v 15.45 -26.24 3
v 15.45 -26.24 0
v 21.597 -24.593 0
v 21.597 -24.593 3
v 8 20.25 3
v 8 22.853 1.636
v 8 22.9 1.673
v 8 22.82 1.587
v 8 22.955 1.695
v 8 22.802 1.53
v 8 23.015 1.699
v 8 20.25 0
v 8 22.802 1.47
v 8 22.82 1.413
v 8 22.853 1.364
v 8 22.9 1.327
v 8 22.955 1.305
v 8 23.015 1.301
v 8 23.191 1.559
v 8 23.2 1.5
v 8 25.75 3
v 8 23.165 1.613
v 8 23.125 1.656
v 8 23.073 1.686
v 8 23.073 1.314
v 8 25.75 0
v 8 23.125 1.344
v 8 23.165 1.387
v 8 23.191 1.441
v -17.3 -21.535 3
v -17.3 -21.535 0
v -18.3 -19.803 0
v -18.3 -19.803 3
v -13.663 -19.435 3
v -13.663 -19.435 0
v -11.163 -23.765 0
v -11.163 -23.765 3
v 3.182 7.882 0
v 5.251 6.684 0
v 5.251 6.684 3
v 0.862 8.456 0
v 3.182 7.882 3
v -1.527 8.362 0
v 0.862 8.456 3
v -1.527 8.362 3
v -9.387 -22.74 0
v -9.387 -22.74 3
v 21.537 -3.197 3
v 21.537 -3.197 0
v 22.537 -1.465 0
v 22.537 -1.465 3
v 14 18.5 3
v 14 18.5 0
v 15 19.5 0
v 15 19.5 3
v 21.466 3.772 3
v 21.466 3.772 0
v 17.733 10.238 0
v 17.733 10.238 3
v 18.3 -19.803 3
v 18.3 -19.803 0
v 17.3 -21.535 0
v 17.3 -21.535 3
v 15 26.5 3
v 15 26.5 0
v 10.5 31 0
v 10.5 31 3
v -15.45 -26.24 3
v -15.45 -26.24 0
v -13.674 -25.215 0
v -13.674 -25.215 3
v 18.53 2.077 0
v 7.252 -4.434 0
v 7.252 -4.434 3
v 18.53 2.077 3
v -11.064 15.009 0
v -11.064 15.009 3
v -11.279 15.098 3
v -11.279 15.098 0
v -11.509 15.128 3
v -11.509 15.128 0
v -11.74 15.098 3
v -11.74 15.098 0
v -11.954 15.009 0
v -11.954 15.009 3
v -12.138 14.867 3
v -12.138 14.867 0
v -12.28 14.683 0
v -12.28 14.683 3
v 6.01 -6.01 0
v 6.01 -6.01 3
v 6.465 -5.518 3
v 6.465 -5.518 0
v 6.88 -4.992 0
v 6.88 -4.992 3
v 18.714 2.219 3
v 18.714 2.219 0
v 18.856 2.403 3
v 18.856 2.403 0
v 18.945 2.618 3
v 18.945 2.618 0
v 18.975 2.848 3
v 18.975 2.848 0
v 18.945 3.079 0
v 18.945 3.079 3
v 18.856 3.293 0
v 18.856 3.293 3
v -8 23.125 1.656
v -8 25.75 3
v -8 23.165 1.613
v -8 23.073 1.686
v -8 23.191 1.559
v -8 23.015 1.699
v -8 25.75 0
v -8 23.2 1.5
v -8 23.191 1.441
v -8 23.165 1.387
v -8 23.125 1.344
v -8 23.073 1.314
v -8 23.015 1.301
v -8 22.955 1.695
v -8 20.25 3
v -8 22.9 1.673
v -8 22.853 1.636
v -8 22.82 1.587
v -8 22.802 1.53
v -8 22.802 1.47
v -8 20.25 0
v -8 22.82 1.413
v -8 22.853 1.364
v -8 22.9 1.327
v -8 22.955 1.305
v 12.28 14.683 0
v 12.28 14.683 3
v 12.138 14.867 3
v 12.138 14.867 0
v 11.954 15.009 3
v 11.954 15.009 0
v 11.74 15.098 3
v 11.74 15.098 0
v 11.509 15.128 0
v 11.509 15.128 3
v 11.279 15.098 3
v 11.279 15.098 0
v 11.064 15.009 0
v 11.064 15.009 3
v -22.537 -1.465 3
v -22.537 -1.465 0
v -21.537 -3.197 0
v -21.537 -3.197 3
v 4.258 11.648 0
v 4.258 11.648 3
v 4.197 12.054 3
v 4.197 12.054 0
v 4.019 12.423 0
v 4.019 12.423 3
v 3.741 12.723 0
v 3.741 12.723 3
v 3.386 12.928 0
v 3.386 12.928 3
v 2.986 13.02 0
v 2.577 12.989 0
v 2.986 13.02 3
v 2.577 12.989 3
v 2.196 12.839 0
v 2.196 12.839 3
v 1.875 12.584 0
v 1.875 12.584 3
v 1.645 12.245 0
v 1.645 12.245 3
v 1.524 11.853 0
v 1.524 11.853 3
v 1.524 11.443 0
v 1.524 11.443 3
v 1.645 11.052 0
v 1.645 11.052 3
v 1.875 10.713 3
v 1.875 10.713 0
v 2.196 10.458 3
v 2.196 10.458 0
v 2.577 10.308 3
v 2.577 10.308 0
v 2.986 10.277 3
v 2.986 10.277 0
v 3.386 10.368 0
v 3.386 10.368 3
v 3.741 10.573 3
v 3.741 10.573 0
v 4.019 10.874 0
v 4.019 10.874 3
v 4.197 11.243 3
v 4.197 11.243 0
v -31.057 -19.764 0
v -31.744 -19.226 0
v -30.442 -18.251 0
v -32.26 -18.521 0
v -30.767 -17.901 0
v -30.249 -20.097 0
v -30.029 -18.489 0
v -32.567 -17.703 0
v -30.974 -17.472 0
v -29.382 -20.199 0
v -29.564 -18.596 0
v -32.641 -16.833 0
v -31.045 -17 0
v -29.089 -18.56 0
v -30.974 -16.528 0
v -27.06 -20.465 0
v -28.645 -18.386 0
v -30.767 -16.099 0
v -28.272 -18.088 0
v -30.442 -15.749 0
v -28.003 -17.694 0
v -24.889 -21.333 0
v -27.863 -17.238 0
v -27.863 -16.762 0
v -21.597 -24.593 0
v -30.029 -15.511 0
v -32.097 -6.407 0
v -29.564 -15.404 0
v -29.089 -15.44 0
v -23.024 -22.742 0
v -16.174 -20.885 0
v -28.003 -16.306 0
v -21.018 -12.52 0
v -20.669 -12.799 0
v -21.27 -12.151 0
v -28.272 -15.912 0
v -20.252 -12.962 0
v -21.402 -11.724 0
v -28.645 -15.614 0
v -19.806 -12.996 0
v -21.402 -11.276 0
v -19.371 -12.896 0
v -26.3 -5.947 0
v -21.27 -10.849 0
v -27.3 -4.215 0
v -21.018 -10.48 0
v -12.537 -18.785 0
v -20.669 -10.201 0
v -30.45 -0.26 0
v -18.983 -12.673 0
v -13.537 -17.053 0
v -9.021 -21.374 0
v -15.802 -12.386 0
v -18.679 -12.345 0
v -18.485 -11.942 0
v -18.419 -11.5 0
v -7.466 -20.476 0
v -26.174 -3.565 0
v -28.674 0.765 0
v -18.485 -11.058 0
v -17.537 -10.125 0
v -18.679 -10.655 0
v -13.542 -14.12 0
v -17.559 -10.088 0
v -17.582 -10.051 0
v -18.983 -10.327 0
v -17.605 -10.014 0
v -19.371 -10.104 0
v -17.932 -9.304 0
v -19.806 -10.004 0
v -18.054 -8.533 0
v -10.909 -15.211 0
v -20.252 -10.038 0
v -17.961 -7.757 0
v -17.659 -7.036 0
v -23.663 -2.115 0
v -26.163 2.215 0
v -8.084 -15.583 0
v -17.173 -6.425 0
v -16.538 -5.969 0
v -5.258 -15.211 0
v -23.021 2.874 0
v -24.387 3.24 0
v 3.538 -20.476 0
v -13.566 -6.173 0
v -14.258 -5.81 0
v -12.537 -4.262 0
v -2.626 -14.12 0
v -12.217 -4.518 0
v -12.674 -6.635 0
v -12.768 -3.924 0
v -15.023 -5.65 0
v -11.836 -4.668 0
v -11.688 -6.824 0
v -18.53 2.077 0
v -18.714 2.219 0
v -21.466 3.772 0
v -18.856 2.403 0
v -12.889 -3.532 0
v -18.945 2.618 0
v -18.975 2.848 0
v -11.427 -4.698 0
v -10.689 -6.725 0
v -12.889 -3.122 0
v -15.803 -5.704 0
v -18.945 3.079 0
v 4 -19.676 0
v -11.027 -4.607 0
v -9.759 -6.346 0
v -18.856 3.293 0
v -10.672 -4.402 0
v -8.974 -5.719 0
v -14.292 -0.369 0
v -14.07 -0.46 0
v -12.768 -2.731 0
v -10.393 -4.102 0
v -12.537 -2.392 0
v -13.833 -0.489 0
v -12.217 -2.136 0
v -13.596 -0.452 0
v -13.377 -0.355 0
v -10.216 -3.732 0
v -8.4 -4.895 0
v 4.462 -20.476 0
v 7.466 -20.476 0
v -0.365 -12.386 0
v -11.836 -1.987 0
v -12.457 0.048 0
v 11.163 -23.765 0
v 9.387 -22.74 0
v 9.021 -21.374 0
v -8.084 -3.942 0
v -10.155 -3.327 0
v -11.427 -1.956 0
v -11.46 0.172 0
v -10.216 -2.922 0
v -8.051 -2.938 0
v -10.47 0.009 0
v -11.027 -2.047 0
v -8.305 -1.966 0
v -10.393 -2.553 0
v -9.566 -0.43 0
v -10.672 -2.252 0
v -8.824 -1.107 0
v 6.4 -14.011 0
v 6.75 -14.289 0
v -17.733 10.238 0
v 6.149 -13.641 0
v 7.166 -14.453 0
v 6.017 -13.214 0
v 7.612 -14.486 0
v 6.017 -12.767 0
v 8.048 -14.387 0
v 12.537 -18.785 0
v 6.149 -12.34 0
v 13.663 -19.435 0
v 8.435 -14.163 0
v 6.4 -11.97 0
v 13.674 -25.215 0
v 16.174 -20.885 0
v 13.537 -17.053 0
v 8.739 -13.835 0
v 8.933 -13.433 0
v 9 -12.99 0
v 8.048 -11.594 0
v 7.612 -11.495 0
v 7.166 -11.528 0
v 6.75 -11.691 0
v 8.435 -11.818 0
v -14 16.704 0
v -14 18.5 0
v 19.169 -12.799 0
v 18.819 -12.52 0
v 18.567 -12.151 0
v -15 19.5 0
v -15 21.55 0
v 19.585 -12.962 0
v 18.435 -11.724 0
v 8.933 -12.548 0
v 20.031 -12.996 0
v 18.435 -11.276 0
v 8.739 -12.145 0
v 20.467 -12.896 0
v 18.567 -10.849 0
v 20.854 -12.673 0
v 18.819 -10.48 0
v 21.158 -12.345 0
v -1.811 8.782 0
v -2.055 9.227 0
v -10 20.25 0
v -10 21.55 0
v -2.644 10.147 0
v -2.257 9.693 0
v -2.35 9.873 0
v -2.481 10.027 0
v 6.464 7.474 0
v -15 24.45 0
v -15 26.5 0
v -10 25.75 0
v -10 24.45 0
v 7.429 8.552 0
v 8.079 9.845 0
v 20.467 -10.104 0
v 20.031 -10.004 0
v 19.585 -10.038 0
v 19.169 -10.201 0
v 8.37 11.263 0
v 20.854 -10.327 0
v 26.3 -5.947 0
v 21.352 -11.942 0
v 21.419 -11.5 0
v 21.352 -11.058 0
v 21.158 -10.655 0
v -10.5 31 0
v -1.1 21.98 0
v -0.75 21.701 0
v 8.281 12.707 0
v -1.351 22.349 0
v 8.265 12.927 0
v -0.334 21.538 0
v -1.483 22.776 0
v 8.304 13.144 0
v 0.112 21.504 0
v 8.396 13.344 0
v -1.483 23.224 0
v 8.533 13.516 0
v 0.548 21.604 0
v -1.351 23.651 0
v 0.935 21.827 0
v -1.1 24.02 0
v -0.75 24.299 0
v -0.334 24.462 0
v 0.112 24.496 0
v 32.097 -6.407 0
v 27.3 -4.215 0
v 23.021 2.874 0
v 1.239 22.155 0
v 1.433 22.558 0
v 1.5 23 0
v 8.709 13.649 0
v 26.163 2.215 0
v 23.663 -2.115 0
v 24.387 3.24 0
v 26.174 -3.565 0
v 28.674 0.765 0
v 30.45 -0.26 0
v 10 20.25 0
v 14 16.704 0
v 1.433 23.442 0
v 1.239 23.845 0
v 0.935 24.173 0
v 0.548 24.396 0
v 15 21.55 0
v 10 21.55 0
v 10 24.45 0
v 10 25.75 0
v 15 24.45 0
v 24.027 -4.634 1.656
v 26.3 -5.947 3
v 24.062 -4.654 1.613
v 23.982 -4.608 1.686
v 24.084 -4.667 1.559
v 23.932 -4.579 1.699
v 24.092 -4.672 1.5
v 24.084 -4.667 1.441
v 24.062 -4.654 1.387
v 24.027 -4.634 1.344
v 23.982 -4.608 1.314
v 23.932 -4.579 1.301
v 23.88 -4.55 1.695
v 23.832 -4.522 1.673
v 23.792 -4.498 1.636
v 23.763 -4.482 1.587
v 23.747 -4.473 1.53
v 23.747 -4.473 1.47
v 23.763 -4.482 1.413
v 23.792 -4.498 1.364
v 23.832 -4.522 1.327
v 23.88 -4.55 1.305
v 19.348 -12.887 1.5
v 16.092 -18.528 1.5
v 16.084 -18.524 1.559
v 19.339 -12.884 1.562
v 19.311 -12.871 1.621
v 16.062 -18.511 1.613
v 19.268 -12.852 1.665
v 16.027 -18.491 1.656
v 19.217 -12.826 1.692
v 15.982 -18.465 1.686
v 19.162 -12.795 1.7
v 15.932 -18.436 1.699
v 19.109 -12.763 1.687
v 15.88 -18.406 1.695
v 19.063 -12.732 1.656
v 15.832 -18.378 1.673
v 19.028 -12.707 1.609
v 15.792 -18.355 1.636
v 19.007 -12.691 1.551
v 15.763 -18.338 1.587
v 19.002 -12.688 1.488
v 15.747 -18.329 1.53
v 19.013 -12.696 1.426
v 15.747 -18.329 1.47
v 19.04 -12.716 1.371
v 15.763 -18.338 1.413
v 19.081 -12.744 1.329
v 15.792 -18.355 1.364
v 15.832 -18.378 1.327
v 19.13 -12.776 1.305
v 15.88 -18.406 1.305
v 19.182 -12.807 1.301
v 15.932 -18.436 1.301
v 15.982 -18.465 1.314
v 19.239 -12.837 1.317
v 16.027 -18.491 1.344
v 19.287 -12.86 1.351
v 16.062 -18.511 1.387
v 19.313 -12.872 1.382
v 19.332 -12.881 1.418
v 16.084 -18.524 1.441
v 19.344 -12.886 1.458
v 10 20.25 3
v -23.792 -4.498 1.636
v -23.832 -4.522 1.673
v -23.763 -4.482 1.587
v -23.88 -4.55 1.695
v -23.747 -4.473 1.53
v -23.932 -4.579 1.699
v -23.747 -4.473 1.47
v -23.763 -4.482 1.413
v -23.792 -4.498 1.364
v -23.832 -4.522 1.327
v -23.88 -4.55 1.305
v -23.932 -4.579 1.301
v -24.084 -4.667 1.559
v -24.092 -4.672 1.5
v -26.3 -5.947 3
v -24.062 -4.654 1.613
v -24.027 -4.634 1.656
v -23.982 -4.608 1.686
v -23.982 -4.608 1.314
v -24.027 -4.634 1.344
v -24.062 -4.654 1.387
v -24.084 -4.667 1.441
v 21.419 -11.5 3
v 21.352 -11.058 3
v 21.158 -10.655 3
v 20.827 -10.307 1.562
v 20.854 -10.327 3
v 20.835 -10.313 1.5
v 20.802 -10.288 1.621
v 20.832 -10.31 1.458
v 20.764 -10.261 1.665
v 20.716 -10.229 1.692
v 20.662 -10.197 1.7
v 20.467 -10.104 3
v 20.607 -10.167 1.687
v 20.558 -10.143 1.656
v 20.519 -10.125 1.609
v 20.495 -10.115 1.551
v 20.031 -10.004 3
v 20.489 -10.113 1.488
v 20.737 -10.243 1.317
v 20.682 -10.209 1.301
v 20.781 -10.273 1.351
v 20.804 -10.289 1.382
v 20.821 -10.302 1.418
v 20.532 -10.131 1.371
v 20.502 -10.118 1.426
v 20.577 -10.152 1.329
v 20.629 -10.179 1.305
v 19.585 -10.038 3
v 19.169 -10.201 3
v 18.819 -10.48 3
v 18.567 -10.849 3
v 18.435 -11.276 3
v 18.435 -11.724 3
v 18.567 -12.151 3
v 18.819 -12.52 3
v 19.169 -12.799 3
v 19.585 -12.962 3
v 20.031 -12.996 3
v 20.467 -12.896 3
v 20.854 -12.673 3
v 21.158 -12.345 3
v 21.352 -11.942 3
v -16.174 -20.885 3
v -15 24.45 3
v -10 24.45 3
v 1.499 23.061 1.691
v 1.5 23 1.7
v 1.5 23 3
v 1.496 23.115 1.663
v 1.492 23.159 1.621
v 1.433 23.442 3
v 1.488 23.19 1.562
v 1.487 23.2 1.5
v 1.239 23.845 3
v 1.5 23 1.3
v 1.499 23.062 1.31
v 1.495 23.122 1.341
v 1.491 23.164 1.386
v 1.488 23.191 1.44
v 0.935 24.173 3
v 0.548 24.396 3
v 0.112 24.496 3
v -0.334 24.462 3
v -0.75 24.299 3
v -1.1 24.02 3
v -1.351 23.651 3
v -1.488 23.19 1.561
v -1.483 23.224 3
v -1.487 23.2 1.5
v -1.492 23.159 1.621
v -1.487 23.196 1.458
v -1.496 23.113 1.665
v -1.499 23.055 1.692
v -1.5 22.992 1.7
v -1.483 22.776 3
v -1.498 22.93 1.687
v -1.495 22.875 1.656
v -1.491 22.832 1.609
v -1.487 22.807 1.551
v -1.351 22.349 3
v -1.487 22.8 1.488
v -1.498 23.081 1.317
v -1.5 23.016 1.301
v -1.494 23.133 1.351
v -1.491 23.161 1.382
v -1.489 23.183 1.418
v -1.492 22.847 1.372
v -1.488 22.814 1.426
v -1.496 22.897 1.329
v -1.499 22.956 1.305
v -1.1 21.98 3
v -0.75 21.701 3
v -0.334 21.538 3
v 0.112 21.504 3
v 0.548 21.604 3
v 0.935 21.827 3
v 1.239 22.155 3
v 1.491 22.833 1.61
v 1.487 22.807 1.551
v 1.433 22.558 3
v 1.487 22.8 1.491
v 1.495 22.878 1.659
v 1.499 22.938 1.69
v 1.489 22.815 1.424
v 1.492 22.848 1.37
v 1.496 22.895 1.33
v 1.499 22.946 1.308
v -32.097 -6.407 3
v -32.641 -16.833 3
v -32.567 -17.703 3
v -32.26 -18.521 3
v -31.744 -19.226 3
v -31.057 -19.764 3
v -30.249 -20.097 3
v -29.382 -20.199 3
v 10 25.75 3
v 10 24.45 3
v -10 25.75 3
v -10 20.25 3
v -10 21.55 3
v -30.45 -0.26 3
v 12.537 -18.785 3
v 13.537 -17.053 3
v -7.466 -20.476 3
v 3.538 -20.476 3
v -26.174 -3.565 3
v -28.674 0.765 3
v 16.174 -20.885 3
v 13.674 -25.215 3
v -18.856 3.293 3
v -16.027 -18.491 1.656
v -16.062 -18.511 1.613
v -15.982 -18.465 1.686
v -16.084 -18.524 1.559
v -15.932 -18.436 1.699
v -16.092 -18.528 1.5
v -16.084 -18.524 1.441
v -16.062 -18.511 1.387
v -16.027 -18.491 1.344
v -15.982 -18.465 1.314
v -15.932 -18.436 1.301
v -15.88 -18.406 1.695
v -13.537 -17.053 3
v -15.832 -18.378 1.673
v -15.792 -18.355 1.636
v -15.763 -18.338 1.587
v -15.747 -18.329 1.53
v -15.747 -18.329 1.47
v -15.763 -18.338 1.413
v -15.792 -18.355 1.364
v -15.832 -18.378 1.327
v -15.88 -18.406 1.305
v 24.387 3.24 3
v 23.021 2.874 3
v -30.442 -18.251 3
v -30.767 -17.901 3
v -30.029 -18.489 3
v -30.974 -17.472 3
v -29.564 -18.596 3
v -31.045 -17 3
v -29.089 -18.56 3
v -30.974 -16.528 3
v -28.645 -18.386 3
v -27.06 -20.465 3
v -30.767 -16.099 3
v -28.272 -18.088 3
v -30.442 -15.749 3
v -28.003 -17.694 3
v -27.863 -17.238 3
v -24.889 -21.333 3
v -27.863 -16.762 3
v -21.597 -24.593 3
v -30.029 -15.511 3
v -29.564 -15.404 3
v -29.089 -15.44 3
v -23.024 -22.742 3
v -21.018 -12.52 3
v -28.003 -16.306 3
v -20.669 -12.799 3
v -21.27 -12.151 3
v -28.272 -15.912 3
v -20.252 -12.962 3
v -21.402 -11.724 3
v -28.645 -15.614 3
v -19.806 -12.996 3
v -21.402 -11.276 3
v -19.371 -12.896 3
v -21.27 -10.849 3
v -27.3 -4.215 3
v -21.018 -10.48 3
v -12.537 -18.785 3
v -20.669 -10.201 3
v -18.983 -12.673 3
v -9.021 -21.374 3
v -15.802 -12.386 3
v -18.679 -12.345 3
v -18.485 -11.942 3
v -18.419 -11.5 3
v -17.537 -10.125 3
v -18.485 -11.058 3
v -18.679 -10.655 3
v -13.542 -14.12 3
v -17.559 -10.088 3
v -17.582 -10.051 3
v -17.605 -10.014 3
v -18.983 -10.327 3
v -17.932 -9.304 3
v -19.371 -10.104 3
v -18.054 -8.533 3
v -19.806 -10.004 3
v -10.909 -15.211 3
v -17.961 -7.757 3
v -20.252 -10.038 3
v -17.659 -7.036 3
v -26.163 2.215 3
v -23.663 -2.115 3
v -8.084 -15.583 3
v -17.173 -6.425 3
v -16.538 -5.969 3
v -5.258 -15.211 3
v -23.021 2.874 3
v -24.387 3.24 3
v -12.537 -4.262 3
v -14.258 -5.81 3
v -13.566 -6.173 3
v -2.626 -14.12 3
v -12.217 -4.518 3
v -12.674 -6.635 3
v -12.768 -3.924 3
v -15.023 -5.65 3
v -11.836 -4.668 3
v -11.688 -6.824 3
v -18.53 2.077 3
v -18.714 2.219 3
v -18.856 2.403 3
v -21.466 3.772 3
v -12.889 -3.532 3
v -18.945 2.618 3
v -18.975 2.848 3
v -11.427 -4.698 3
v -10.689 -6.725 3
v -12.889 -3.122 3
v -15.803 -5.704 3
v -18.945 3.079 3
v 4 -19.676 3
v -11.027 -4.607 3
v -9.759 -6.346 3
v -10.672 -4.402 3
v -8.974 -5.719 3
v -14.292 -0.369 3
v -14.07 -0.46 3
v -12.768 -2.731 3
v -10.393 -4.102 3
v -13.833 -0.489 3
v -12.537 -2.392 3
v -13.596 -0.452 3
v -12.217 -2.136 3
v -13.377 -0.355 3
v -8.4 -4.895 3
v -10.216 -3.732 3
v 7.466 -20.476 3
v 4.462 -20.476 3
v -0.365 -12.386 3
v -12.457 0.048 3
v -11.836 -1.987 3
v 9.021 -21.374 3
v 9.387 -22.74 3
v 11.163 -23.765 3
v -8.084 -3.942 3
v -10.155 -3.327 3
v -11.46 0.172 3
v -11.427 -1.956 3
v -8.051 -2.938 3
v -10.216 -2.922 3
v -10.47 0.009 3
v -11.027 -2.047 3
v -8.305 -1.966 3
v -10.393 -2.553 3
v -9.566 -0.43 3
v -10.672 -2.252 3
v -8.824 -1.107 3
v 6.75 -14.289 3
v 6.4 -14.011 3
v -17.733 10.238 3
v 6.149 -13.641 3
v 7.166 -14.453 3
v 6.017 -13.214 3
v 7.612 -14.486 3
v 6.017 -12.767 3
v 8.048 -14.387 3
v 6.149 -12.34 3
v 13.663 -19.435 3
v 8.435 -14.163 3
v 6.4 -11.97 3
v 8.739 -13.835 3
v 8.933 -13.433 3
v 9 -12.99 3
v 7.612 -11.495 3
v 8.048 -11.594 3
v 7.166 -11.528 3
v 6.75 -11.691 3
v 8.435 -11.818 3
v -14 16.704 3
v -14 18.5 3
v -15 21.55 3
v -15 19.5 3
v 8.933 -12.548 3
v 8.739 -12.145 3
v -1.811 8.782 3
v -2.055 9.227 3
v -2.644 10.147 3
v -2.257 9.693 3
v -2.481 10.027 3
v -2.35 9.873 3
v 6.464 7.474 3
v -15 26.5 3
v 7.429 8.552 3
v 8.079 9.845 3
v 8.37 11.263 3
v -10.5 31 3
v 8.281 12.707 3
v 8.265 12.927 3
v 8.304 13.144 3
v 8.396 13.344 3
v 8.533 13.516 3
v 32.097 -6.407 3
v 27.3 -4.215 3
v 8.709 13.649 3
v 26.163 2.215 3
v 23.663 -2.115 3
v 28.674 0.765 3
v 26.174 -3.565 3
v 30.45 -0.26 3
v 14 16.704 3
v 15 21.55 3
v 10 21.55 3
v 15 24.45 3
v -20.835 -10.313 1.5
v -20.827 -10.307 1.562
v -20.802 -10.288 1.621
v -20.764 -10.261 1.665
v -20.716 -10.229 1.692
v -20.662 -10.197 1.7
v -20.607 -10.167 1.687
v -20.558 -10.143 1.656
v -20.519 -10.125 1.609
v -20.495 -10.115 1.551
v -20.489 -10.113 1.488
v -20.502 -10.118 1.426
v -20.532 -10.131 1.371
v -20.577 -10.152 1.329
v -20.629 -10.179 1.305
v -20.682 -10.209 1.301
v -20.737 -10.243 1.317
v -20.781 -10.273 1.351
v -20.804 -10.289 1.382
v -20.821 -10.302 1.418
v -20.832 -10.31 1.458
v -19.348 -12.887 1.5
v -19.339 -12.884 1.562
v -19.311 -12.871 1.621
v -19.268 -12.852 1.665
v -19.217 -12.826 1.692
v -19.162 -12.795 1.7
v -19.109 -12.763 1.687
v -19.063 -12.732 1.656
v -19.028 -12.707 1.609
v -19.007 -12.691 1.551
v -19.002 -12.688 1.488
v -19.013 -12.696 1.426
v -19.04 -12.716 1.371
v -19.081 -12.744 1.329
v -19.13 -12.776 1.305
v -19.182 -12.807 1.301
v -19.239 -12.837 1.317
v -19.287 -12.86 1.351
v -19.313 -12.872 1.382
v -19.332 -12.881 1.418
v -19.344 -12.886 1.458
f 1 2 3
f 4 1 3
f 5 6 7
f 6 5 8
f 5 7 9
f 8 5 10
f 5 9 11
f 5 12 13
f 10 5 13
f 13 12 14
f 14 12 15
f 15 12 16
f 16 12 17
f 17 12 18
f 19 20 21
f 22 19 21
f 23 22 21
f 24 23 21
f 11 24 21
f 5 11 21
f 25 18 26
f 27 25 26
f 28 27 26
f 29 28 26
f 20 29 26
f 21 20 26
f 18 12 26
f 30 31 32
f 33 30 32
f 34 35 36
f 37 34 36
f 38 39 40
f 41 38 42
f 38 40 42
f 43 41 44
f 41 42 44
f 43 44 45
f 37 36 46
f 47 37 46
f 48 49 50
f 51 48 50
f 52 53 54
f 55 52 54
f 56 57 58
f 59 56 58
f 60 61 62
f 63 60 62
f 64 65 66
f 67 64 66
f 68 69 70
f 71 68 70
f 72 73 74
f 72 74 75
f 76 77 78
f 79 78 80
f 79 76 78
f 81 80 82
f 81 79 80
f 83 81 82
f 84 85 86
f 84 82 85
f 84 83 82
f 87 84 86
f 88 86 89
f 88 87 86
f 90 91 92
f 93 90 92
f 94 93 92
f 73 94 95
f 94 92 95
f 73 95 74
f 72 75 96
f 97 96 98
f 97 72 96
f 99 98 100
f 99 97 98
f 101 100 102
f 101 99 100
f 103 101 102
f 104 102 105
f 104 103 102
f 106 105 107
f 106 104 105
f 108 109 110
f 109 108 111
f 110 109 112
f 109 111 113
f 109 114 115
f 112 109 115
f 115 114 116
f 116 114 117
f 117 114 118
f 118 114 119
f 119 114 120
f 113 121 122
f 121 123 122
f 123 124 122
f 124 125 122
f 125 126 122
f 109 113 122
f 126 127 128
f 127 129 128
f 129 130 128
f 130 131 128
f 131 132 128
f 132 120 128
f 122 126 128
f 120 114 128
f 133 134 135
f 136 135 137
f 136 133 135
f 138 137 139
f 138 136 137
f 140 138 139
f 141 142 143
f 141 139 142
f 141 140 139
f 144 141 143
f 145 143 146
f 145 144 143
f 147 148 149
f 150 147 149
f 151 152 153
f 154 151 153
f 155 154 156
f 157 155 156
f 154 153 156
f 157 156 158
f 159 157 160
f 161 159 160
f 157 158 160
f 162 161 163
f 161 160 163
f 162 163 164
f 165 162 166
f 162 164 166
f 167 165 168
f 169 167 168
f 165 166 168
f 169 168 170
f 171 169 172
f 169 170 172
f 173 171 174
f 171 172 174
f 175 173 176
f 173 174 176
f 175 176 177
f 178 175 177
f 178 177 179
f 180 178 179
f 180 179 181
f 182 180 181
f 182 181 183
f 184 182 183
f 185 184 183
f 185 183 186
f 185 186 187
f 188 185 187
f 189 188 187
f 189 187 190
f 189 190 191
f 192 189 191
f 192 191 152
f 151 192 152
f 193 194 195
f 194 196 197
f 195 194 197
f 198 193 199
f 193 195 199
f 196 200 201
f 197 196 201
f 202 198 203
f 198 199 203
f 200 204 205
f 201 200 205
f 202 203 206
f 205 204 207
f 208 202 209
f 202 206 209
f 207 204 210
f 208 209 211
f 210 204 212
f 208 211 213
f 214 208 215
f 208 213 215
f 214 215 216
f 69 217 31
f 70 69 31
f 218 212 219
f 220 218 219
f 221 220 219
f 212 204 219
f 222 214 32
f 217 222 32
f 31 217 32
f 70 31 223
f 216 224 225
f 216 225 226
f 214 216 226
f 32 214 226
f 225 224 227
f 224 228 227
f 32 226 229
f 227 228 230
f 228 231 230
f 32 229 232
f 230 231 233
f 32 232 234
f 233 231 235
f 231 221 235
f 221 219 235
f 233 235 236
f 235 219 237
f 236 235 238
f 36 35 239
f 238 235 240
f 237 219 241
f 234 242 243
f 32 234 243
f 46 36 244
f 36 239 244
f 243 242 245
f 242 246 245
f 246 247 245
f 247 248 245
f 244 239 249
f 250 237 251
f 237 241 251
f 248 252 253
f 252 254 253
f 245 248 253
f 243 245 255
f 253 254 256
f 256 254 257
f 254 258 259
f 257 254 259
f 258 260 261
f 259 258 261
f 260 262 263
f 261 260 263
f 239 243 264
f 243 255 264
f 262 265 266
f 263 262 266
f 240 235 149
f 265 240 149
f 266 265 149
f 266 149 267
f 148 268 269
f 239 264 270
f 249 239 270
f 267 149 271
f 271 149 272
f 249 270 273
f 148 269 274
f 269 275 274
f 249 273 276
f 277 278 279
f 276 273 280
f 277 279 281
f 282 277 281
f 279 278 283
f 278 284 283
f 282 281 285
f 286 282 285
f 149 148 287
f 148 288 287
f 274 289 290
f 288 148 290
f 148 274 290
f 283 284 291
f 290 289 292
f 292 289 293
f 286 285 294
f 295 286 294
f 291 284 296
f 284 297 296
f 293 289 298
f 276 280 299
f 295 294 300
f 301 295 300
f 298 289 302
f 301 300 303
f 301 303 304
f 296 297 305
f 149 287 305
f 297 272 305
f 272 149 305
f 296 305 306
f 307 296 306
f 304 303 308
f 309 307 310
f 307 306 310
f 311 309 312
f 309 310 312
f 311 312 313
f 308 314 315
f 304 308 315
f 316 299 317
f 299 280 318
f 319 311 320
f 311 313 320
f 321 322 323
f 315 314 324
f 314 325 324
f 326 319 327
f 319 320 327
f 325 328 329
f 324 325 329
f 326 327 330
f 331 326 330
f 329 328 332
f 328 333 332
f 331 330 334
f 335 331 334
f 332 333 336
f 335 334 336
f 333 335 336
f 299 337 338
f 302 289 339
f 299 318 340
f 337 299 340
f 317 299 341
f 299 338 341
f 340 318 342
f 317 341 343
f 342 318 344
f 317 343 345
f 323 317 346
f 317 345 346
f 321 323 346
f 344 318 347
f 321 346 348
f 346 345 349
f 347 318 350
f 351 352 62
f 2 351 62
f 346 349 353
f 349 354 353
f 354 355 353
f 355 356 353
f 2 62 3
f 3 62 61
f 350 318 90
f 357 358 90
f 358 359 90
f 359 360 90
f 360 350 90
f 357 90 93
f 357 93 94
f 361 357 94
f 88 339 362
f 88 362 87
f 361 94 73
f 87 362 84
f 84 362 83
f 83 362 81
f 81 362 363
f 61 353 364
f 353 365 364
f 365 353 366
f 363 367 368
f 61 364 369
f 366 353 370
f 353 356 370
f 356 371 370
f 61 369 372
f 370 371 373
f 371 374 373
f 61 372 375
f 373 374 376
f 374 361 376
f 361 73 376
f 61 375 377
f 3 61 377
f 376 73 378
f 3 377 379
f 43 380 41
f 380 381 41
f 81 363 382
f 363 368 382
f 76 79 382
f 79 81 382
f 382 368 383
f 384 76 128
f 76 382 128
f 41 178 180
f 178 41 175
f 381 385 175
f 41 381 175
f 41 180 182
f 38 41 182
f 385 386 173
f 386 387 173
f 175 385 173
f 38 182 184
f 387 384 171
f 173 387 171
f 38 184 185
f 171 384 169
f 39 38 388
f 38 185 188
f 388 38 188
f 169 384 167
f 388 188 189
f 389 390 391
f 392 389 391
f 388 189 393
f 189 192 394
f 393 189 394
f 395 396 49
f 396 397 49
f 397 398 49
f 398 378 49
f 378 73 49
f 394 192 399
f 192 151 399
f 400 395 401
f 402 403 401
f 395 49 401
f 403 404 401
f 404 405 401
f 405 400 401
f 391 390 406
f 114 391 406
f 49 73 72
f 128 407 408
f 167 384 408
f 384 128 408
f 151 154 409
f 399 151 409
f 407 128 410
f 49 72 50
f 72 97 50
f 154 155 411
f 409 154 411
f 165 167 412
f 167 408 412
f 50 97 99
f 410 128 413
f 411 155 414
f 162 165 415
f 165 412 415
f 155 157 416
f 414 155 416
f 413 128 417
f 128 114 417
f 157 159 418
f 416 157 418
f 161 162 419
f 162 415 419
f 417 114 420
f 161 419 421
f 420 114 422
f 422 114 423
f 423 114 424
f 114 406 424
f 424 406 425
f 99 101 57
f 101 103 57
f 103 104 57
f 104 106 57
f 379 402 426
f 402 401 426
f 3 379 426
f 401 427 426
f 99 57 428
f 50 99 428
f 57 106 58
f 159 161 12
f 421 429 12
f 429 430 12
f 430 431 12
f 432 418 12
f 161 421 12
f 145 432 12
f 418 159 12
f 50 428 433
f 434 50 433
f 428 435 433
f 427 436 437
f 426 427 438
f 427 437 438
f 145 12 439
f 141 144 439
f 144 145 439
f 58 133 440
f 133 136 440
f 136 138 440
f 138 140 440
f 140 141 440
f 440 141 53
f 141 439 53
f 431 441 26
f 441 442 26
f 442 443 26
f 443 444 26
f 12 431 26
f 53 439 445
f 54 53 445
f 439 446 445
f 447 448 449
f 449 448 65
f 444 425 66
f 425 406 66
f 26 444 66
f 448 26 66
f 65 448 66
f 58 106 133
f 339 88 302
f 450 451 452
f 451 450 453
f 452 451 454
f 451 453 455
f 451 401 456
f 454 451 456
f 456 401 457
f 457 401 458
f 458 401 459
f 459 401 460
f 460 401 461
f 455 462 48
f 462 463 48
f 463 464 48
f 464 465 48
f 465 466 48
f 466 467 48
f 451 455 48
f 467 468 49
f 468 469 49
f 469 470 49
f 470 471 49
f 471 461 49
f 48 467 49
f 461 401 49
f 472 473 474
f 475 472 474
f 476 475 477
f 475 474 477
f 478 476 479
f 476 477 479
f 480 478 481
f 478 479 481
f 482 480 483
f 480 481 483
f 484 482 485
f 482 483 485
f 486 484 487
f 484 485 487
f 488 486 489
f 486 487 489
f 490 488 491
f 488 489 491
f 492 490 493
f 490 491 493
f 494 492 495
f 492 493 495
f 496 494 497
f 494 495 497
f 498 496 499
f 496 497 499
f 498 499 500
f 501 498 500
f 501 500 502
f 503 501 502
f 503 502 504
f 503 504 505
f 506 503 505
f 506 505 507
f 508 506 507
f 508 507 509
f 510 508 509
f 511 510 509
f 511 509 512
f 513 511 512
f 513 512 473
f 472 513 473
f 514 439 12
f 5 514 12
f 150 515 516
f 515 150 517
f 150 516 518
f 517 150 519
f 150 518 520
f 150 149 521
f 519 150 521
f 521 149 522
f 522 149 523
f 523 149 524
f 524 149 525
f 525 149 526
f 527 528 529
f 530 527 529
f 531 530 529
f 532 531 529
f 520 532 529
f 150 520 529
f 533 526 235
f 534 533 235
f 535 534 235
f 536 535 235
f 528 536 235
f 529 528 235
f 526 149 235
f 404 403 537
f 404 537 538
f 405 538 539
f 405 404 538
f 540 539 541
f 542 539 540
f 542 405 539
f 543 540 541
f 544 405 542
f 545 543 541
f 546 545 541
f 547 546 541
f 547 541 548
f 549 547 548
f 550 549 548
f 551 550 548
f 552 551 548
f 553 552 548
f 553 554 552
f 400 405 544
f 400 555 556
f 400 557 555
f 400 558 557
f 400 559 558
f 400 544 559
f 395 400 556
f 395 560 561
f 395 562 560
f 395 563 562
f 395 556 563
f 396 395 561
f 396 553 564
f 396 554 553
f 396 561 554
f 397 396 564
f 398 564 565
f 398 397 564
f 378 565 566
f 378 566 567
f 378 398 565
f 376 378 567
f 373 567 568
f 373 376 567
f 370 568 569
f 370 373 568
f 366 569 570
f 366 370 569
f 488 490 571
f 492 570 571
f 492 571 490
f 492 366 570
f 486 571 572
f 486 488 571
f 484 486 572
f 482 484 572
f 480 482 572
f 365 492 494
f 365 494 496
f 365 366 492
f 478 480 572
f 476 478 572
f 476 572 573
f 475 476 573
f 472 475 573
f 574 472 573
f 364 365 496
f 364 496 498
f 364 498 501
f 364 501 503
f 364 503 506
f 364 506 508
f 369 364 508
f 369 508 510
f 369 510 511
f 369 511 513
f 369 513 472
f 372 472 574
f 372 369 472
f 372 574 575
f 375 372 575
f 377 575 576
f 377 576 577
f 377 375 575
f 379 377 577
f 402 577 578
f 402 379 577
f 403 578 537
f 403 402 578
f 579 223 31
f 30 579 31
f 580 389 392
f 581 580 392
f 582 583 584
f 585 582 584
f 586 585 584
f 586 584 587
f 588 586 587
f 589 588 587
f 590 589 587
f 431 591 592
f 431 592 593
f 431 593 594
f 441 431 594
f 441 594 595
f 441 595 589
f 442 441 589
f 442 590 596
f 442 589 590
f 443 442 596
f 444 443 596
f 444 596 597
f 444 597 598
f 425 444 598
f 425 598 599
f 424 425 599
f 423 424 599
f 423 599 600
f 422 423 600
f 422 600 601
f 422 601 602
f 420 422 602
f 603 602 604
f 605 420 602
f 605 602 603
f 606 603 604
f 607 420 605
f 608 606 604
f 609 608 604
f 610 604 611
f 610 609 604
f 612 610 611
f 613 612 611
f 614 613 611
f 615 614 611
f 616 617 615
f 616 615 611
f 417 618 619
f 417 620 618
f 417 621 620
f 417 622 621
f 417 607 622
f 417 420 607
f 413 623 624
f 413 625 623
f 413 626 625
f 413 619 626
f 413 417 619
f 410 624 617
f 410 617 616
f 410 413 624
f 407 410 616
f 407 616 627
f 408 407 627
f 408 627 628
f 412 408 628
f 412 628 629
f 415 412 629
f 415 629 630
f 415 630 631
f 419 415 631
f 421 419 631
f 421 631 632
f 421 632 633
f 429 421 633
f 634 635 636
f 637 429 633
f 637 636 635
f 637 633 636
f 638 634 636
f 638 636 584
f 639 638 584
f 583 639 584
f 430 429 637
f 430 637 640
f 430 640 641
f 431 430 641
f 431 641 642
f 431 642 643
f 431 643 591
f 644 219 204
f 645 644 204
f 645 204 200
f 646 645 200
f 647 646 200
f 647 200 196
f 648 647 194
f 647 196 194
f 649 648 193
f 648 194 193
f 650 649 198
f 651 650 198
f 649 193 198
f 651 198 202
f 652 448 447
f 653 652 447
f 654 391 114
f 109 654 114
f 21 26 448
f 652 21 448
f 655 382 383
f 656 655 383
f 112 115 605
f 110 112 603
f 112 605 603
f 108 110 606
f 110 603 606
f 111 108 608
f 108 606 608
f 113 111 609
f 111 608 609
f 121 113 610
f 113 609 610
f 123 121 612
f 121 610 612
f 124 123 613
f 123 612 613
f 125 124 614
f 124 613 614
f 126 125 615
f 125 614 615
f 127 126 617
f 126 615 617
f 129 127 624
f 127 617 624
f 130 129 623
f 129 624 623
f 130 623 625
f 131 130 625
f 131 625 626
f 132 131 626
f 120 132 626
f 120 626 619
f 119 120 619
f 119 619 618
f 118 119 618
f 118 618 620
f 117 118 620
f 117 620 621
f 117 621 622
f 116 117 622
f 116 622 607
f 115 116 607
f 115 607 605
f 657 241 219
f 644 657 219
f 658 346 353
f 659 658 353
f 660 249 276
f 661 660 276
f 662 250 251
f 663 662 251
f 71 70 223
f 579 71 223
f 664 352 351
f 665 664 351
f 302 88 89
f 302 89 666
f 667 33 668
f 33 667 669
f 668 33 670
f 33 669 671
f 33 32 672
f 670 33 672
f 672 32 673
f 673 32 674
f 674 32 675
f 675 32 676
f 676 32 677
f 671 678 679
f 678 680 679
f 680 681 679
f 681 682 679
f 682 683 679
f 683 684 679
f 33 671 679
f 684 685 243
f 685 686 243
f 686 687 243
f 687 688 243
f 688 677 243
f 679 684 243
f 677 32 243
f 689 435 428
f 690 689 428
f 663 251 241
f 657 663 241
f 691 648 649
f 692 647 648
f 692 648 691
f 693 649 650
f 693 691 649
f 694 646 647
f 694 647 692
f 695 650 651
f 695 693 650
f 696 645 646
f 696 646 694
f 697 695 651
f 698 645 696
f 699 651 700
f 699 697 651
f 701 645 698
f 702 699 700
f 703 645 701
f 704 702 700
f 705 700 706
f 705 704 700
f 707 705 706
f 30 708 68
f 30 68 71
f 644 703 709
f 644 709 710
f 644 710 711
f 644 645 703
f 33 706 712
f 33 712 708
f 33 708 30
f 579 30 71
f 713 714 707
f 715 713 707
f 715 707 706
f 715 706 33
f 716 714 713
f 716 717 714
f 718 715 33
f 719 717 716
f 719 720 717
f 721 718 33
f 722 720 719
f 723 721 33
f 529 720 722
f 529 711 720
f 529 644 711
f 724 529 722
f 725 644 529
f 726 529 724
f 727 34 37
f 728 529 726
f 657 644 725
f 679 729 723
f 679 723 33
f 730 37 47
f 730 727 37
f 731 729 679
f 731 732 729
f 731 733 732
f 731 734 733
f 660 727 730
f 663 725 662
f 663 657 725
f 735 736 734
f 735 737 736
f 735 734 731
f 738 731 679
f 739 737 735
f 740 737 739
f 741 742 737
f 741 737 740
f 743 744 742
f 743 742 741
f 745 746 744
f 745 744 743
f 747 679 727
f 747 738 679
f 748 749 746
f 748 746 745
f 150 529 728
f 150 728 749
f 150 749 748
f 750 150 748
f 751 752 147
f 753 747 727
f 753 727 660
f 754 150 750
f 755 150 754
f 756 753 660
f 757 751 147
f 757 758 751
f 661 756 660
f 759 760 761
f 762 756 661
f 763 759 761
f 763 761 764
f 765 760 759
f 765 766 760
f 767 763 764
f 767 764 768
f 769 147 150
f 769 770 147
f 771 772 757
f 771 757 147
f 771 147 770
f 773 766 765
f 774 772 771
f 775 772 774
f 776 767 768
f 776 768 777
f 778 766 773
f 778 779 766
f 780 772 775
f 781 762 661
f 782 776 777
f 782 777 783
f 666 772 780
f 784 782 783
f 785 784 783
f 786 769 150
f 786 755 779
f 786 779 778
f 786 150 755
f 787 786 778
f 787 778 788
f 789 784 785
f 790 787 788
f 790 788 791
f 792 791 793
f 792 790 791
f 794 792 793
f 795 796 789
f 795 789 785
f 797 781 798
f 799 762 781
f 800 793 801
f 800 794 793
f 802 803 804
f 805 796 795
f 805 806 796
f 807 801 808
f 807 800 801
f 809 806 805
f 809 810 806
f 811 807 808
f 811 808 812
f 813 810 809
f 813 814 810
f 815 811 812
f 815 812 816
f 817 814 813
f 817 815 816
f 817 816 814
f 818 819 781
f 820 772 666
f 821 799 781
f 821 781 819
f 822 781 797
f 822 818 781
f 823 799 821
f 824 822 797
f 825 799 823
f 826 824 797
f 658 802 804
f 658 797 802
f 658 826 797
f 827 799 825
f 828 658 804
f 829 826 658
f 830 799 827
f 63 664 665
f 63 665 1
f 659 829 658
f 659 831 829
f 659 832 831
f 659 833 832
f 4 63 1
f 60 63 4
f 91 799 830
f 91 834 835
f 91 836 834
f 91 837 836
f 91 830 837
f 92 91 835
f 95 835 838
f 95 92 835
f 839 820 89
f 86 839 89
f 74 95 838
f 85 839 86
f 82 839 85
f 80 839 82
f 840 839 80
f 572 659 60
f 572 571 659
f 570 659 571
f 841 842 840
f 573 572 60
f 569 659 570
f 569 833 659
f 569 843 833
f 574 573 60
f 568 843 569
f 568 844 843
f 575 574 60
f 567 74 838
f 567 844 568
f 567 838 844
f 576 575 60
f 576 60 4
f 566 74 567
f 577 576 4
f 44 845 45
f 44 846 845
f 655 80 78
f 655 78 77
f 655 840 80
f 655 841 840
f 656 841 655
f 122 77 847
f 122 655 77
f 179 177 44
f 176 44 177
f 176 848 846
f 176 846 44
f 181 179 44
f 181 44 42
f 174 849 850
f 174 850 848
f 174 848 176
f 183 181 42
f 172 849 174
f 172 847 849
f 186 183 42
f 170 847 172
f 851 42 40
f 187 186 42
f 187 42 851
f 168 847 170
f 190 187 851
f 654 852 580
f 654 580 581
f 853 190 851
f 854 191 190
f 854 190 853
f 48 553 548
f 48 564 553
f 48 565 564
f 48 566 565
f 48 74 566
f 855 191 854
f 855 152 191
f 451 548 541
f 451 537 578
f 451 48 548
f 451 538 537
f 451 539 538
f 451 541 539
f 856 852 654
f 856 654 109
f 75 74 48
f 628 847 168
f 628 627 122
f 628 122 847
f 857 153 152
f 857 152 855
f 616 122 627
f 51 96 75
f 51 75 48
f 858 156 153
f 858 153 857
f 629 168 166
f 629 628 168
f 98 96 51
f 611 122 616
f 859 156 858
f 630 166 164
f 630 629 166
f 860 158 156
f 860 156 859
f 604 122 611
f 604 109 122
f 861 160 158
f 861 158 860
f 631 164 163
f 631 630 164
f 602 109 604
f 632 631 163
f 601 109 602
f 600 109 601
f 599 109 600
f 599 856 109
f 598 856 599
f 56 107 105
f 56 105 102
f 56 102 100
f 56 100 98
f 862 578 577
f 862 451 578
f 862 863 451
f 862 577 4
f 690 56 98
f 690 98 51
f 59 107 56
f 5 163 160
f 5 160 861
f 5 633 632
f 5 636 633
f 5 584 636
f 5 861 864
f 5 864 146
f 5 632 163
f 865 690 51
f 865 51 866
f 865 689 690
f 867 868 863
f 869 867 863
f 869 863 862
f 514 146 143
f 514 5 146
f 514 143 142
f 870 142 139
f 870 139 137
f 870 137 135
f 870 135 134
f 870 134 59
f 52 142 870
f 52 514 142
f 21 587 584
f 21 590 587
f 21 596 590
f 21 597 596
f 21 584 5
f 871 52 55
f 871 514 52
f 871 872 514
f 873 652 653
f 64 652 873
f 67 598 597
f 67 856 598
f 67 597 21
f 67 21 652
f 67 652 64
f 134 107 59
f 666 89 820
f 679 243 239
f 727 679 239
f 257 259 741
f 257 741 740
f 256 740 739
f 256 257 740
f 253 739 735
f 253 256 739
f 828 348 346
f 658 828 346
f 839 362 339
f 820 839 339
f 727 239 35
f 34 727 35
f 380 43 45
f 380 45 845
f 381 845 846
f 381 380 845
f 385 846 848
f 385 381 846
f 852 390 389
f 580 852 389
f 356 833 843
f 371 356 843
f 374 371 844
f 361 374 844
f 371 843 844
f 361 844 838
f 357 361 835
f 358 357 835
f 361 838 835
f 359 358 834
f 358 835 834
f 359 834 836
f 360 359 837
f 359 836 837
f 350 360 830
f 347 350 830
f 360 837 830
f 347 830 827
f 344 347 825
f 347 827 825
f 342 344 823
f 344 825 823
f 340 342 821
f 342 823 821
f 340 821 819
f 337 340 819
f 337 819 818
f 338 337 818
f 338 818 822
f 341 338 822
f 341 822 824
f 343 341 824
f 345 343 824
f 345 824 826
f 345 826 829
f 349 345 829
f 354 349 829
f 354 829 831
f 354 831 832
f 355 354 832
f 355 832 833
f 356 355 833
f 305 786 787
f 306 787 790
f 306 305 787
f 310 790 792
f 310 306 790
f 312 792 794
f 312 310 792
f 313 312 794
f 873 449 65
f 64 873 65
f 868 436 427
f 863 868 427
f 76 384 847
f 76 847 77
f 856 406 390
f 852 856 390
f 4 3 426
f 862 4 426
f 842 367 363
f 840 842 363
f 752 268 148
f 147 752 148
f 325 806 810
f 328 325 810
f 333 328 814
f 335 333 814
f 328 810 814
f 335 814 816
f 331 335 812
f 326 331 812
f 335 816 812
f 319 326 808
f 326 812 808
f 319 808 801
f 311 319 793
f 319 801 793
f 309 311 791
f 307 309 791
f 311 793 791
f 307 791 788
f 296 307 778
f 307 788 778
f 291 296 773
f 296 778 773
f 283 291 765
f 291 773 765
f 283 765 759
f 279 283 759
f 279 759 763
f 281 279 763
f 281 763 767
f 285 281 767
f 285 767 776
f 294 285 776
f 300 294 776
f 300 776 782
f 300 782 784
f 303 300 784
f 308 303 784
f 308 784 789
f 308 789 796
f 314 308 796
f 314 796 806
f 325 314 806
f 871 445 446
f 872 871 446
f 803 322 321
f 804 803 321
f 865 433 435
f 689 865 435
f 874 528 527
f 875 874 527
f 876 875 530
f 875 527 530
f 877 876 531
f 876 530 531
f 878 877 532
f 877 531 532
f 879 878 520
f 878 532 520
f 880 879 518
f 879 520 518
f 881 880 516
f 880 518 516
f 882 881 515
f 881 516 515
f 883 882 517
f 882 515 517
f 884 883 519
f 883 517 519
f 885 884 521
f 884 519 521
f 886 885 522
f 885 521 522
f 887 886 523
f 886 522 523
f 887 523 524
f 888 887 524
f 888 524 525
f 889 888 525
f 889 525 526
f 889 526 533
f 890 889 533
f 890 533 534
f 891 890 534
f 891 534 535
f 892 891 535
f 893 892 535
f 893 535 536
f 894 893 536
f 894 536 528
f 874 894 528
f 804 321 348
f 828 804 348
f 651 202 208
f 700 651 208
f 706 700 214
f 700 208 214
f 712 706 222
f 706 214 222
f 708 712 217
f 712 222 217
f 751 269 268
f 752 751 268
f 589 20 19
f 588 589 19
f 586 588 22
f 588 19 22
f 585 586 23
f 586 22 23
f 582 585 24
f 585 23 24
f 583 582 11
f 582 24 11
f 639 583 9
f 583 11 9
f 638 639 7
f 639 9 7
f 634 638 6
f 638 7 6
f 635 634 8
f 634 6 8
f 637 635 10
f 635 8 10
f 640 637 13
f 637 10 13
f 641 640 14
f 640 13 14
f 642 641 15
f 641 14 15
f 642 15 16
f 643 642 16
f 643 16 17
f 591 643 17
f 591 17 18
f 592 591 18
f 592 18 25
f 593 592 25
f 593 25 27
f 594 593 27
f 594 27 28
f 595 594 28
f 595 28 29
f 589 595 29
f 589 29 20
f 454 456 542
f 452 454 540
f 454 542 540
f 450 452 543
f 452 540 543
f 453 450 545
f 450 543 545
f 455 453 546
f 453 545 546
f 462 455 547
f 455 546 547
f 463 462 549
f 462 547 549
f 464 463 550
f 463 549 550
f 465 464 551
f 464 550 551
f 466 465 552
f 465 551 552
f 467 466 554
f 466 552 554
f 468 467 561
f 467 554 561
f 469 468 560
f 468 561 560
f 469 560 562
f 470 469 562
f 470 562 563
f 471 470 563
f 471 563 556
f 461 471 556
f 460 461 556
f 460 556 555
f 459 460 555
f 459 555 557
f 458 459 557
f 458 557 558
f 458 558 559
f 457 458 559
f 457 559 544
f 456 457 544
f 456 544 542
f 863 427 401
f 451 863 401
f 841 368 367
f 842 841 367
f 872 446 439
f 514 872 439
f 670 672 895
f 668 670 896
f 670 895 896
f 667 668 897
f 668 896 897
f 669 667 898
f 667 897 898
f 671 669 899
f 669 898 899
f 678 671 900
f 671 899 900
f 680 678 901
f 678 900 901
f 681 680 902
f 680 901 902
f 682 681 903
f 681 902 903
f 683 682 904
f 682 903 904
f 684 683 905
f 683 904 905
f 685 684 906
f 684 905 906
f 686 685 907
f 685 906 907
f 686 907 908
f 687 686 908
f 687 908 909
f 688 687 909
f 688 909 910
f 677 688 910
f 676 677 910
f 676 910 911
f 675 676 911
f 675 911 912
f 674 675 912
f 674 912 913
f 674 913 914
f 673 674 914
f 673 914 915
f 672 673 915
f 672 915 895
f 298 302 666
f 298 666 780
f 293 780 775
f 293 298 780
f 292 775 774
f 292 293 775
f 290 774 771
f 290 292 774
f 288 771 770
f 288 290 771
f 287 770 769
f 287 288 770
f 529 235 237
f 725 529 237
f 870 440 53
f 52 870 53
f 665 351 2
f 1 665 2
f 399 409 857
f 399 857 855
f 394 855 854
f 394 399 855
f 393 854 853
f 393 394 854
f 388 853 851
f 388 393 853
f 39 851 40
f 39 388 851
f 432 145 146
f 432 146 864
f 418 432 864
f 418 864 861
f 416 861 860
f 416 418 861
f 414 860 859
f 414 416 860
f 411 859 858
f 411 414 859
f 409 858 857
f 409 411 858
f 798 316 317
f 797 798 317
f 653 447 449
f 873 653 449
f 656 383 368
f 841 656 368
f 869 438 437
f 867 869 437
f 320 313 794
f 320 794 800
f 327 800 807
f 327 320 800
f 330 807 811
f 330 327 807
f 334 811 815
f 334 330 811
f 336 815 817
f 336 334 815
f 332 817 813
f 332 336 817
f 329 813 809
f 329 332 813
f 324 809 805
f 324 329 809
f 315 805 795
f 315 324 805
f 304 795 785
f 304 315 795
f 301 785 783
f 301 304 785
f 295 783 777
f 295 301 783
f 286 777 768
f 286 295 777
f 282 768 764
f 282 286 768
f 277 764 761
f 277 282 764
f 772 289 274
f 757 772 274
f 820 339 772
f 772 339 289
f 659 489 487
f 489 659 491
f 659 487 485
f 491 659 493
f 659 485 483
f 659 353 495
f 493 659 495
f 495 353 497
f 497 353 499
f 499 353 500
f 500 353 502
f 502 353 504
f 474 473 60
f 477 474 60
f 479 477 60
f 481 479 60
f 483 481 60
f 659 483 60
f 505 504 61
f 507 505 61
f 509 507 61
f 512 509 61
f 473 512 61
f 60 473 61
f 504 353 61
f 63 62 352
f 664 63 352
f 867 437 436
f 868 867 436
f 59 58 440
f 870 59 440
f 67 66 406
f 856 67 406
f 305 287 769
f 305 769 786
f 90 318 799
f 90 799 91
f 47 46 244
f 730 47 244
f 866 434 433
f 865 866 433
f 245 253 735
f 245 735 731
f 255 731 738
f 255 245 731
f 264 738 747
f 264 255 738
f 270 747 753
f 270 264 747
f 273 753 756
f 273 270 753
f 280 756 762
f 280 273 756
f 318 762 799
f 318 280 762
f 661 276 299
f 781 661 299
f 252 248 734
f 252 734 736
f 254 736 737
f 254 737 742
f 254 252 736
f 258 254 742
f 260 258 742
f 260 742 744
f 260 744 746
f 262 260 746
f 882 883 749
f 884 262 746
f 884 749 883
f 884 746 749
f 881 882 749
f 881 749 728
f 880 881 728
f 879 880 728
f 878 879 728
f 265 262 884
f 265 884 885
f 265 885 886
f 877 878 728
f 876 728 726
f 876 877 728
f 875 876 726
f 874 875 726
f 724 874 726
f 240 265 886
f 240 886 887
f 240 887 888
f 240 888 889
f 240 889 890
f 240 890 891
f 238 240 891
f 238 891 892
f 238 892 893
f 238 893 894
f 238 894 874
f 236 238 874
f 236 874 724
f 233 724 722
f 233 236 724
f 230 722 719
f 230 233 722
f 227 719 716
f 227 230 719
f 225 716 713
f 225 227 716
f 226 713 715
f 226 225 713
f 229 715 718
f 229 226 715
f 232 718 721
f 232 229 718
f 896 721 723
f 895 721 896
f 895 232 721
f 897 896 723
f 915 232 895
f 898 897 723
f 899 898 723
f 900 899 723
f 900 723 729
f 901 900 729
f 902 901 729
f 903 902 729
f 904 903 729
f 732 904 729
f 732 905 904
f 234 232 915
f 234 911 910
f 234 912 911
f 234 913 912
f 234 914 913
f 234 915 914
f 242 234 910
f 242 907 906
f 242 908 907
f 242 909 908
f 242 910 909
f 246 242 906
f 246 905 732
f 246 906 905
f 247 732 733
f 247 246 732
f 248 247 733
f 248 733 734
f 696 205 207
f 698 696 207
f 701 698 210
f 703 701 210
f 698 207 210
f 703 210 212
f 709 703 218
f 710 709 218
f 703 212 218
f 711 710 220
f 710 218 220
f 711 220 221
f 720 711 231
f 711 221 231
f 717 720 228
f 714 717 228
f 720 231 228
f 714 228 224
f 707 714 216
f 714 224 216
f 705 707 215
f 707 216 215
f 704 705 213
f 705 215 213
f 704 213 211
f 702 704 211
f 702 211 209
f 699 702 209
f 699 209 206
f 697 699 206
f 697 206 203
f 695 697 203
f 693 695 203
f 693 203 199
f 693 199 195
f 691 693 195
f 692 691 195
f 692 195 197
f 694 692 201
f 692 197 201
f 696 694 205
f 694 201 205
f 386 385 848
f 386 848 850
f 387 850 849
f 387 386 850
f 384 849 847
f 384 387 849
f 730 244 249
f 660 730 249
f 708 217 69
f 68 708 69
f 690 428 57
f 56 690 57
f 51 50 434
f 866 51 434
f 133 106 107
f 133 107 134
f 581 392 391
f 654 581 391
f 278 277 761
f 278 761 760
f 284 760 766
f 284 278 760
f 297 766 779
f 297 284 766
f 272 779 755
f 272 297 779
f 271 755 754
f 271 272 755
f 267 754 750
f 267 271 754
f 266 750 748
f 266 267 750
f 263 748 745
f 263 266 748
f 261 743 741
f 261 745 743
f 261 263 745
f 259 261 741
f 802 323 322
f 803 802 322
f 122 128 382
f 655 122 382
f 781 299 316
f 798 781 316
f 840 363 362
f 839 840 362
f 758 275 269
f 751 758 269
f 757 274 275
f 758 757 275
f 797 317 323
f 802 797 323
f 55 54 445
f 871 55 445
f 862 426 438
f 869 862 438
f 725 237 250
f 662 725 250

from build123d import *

# Parameters (mm, degrees)
SKETCH1_R           = 1.5
BOSS_EXTRUDE1_DEPTH = 3
SKETCH2_R           = 0.2
CUT_EXTRUDE1_DEPTH  = 51.771570482
CIRPATTERN1_COUNT   = 3
SKETCH3_R           = 8.5
CUT_EXTRUDE2_DEPTH  = 45.723637705
SKETCH4_R           = 1.5
SKETCH4_R_2         = 1.375
CUT_EXTRUDE3_DEPTH  = 45.723637705
CUT_EXTRUDE6_DEPTH  = 45.723637705
SKETCH10_R          = 1.6
BOSS_EXTRUDE3_DEPTH = 3
CUT_EXTRUDE7_DEPTH  = 46.118589611


with BuildPart() as part:
    # Sketch1 → Boss-Extrude1 (new body)
    with BuildSketch(Plane.XY):
        Polygon((8, 23), (8, 25.75), (10, 25.75), (10, 24.45), (15, 24.45), (15, 26.5), (10.5, 31), (-10.5, 31), (-15, 26.5), (-15, 24.45), (-10, 24.45), (-10, 25.75), (-8, 25.75), (-8, 23), (-8, 20.25), (-10, 20.25), (-10, 21.55), (-15, 21.55), (-15, 19.5), (-14, 18.5), (-14, 16.703779947), (-17.732948887, 10.238122813), (-21.465897773, 3.772465679), (-23.02146997, 2.874355653), (-24.387495374, 3.240381057), (-26.162847452, 2.215381057), (-23.662847452, -2.114745962), (-22.537014427, -1.464745962), (-21.537014427, -3.19679677), (-23.918584287, -4.57179677), (-26.300154147, -5.94679677), (-27.300154147, -4.214745962), (-26.174321123, -3.564745962), (-28.674321123, 0.765381057), (-30.4496732, -0.259618943), (-32.096787517, -6.40673326), (-21.596787517, -24.59326674), (-15.4496732, -26.240381057), (-13.674321123, -25.215381057), (-16.174321123, -20.885254038), (-17.300154147, -21.535254038), (-18.300154147, -19.80320323), (-15.918584287, -18.42820323), (-13.537014427, -17.05320323), (-12.537014427, -18.785254038), (-13.662847452, -19.435254038), (-11.162847452, -23.765381057), (-9.387495374, -22.740381057), (-9.02146997, -21.374355653), (-7.465897773, -20.476245627), (0, -20.476245627), (7.465897773, -20.476245627), (9.02146997, -21.374355653), (9.387495374, -22.740381057), (11.162847452, -23.765381057), (13.662847452, -19.435254038), (12.537014427, -18.785254038), (13.537014427, -17.05320323), (15.918584287, -18.42820323), (18.300154147, -19.80320323), (17.300154147, -21.535254038), (16.174321123, -20.885254038), (13.674321123, -25.215381057), (15.4496732, -26.240381057), (21.596787517, -24.59326674), (32.096787517, -6.40673326), (30.4496732, -0.259618943), (28.674321123, 0.765381057), (26.174321123, -3.564745962), (27.300154147, -4.214745962), (26.300154147, -5.94679677), (23.918584287, -4.57179677), (21.537014427, -3.19679677), (22.537014427, -1.464745962), (23.662847452, -2.114745962), (26.162847452, 2.215381057), (24.387495374, 3.240381057), (23.02146997, 2.874355653), (21.465897773, 3.772465679), (17.732948887, 10.238122813), (14, 16.703779947), (14, 18.5), (15, 19.5), (15, 21.55), (10, 21.55), (10, 20.25), (8, 20.25), align=None)
        with Locations((0, 23)):
            Circle(SKETCH1_R, mode=Mode.SUBTRACT)
        with Locations((19.918584287, -11.5)):
            Circle(SKETCH1_R, mode=Mode.SUBTRACT)
        with Locations((-19.918584287, -11.5)):
            Circle(SKETCH1_R, mode=Mode.SUBTRACT)
    extrude(amount=BOSS_EXTRUDE1_DEPTH)

    # Sketch2 → Cut-Extrude1 (cut, through all)
    with BuildSketch(Plane(origin=(8, 0, 0), x_dir=(0, 0, -1), z_dir=(1, 0, 0))):
        with Locations(Location((-1.5, 23, 0), (0, 0, 90))):
            Circle(SKETCH2_R)
    cut_extrude1 = extrude(amount=-CUT_EXTRUDE1_DEPTH, mode=Mode.SUBTRACT)

    # CirPattern1: Cut-Extrude1 ×3 about axis
    cirpattern1_axis = Axis((0, 0, -0.25), (0, 0, 1))
    for i in range(1, CIRPATTERN1_COUNT):
        add(cut_extrude1.rotate(cirpattern1_axis, i * 360 / CIRPATTERN1_COUNT), mode=Mode.SUBTRACT)

    # Sketch3 → Cut-Extrude2 (cut, through all)
    with BuildSketch(Plane.XY.offset(3)):
        Circle(SKETCH3_R)
    extrude(amount=-CUT_EXTRUDE2_DEPTH, mode=Mode.SUBTRACT)

    # Sketch4 → Cut-Extrude3 (cut, through all)
    with BuildSketch(Plane.XY.offset(3)):
        with Locations((7.5, -12.990381057)):
            Circle(SKETCH4_R)
        with Locations((-11.529543503, -3.327104841)):
            Circle(SKETCH4_R_2)
        with Locations((2.883414438, 11.648429988)):
            Circle(SKETCH4_R_2)
    extrude(amount=-CUT_EXTRUDE3_DEPTH, mode=Mode.SUBTRACT)

    # Sketch8 → Cut-Extrude6 (cut, through all)
    with BuildSketch(Plane(origin=(0, 0, 0), x_dir=(-1, 0, 0), z_dir=(0, 0, -1))):
        with BuildLine():
            Line((12.279936491, 14.683017338), (18.855834264, 3.293228289))
            ThreePointArc((18.855834264, 3.293228289), (18.94474564, 2.617879339), (18.530071655, 2.077465679))
            Line((18.530071655, 2.077465679), (14.291991324, -0.36939114))
            ThreePointArc((14.291991324, -0.36939114), (13.832521283, -0.488510893), (13.377167051, -0.354515528))
            ThreePointArc((13.377167051, -0.354515528), (8.03139394, -3.440901304), (13.566455789, -6.173328363))
            ThreePointArc((13.566455789, -6.173328363), (17.172799511, -6.424627154), (17.604766052, -10.013815228))
            ThreePointArc((17.604766052, -10.013815228), (17.57023213, -10.069006588), (17.537014427, -10.125))
            ThreePointArc((17.537014427, -10.125), (9.508411975, -15.48954065), (0.36493223, -12.38574751))
            Line((0.36493223, -12.38574751), (-6.01040764, -6.01040764))
            ThreePointArc((-6.01040764, -6.01040764), (-6.677816527, -5.258970093), (-7.251866025, -4.434009377))
            Line((-7.251866025, -4.434009377), (-18.530071655, 2.077465679))
            ThreePointArc((-18.530071655, 2.077465679), (-18.94474564, 2.617879339), (-18.855834264, 3.293228289))
            Line((-18.855834264, 3.293228289), (-12.279936491, 14.683017338))
            ThreePointArc((-12.279936491, 14.683017338), (-11.739522831, 15.097691323), (-11.064173881, 15.008779947))
            Line((-11.064173881, 15.008779947), (-8.70895574, 13.648994119))
            ThreePointArc((-8.70895574, 13.648994119), (-8.343780593, 13.24662835), (-8.280593962, 12.7069446))
            ThreePointArc((-8.280593962, 12.7069446), (-7.79681587, 9.176894763), (-5.250985835, 6.68409663))
            ThreePointArc((-5.250985835, 6.68409663), (-2.04241856, 8.250971241), (1.526575519, 8.361792104))
            ThreePointArc((1.526575519, 8.361792104), (1.938099301, 9.002110796), (2.257279563, 9.69311283))
            ThreePointArc((2.257279563, 9.69311283), (2.411493279, 9.95368058), (2.644137319, 10.147469572))
            Line((2.644137319, 10.147469572), (11.064173881, 15.008779947))
            ThreePointArc((11.064173881, 15.008779947), (11.739522831, 15.097691323), (12.279936491, 14.683017338))
        make_face()
    extrude(amount=-CUT_EXTRUDE6_DEPTH, mode=Mode.SUBTRACT)

    # Sketch10 → Boss-Extrude3 (add, through all)
    with BuildSketch(Plane(origin=(0, 0, 0), x_dir=(-1, 0, 0), z_dir=(0, 0, -1))):
        with BuildLine():
            Line((32.096787517, -6.40673326), (32.640521415, -16.833350806))
            ThreePointArc((32.640521415, -16.833350806), (31.744101835, -19.225646902), (29.382221383, -20.199386806))
            ThreePointArc((29.382221383, -20.199386806), (24.889296585, -21.332829657), (21.596787517, -24.59326674))
            Line((21.596787517, -24.59326674), (32.096787517, -6.40673326))
        make_face()
        with Locations((29.444863729, -17)):
            Circle(SKETCH10_R, mode=Mode.SUBTRACT)
    extrude(amount=-BOSS_EXTRUDE3_DEPTH)

    # Sketch11 → Cut-Extrude7 (cut, through all)
    with BuildSketch(Plane(origin=(0, 0, 0), x_dir=(-1, 0, 0), z_dir=(0, 0, -1))):
        Polygon((-4.461880215, -20.476245627), (-3.538119785, -20.476245627), (-4, -19.676245627), align=None)
    extrude(amount=-CUT_EXTRUDE7_DEPTH, mode=Mode.SUBTRACT)


solid = part.part
